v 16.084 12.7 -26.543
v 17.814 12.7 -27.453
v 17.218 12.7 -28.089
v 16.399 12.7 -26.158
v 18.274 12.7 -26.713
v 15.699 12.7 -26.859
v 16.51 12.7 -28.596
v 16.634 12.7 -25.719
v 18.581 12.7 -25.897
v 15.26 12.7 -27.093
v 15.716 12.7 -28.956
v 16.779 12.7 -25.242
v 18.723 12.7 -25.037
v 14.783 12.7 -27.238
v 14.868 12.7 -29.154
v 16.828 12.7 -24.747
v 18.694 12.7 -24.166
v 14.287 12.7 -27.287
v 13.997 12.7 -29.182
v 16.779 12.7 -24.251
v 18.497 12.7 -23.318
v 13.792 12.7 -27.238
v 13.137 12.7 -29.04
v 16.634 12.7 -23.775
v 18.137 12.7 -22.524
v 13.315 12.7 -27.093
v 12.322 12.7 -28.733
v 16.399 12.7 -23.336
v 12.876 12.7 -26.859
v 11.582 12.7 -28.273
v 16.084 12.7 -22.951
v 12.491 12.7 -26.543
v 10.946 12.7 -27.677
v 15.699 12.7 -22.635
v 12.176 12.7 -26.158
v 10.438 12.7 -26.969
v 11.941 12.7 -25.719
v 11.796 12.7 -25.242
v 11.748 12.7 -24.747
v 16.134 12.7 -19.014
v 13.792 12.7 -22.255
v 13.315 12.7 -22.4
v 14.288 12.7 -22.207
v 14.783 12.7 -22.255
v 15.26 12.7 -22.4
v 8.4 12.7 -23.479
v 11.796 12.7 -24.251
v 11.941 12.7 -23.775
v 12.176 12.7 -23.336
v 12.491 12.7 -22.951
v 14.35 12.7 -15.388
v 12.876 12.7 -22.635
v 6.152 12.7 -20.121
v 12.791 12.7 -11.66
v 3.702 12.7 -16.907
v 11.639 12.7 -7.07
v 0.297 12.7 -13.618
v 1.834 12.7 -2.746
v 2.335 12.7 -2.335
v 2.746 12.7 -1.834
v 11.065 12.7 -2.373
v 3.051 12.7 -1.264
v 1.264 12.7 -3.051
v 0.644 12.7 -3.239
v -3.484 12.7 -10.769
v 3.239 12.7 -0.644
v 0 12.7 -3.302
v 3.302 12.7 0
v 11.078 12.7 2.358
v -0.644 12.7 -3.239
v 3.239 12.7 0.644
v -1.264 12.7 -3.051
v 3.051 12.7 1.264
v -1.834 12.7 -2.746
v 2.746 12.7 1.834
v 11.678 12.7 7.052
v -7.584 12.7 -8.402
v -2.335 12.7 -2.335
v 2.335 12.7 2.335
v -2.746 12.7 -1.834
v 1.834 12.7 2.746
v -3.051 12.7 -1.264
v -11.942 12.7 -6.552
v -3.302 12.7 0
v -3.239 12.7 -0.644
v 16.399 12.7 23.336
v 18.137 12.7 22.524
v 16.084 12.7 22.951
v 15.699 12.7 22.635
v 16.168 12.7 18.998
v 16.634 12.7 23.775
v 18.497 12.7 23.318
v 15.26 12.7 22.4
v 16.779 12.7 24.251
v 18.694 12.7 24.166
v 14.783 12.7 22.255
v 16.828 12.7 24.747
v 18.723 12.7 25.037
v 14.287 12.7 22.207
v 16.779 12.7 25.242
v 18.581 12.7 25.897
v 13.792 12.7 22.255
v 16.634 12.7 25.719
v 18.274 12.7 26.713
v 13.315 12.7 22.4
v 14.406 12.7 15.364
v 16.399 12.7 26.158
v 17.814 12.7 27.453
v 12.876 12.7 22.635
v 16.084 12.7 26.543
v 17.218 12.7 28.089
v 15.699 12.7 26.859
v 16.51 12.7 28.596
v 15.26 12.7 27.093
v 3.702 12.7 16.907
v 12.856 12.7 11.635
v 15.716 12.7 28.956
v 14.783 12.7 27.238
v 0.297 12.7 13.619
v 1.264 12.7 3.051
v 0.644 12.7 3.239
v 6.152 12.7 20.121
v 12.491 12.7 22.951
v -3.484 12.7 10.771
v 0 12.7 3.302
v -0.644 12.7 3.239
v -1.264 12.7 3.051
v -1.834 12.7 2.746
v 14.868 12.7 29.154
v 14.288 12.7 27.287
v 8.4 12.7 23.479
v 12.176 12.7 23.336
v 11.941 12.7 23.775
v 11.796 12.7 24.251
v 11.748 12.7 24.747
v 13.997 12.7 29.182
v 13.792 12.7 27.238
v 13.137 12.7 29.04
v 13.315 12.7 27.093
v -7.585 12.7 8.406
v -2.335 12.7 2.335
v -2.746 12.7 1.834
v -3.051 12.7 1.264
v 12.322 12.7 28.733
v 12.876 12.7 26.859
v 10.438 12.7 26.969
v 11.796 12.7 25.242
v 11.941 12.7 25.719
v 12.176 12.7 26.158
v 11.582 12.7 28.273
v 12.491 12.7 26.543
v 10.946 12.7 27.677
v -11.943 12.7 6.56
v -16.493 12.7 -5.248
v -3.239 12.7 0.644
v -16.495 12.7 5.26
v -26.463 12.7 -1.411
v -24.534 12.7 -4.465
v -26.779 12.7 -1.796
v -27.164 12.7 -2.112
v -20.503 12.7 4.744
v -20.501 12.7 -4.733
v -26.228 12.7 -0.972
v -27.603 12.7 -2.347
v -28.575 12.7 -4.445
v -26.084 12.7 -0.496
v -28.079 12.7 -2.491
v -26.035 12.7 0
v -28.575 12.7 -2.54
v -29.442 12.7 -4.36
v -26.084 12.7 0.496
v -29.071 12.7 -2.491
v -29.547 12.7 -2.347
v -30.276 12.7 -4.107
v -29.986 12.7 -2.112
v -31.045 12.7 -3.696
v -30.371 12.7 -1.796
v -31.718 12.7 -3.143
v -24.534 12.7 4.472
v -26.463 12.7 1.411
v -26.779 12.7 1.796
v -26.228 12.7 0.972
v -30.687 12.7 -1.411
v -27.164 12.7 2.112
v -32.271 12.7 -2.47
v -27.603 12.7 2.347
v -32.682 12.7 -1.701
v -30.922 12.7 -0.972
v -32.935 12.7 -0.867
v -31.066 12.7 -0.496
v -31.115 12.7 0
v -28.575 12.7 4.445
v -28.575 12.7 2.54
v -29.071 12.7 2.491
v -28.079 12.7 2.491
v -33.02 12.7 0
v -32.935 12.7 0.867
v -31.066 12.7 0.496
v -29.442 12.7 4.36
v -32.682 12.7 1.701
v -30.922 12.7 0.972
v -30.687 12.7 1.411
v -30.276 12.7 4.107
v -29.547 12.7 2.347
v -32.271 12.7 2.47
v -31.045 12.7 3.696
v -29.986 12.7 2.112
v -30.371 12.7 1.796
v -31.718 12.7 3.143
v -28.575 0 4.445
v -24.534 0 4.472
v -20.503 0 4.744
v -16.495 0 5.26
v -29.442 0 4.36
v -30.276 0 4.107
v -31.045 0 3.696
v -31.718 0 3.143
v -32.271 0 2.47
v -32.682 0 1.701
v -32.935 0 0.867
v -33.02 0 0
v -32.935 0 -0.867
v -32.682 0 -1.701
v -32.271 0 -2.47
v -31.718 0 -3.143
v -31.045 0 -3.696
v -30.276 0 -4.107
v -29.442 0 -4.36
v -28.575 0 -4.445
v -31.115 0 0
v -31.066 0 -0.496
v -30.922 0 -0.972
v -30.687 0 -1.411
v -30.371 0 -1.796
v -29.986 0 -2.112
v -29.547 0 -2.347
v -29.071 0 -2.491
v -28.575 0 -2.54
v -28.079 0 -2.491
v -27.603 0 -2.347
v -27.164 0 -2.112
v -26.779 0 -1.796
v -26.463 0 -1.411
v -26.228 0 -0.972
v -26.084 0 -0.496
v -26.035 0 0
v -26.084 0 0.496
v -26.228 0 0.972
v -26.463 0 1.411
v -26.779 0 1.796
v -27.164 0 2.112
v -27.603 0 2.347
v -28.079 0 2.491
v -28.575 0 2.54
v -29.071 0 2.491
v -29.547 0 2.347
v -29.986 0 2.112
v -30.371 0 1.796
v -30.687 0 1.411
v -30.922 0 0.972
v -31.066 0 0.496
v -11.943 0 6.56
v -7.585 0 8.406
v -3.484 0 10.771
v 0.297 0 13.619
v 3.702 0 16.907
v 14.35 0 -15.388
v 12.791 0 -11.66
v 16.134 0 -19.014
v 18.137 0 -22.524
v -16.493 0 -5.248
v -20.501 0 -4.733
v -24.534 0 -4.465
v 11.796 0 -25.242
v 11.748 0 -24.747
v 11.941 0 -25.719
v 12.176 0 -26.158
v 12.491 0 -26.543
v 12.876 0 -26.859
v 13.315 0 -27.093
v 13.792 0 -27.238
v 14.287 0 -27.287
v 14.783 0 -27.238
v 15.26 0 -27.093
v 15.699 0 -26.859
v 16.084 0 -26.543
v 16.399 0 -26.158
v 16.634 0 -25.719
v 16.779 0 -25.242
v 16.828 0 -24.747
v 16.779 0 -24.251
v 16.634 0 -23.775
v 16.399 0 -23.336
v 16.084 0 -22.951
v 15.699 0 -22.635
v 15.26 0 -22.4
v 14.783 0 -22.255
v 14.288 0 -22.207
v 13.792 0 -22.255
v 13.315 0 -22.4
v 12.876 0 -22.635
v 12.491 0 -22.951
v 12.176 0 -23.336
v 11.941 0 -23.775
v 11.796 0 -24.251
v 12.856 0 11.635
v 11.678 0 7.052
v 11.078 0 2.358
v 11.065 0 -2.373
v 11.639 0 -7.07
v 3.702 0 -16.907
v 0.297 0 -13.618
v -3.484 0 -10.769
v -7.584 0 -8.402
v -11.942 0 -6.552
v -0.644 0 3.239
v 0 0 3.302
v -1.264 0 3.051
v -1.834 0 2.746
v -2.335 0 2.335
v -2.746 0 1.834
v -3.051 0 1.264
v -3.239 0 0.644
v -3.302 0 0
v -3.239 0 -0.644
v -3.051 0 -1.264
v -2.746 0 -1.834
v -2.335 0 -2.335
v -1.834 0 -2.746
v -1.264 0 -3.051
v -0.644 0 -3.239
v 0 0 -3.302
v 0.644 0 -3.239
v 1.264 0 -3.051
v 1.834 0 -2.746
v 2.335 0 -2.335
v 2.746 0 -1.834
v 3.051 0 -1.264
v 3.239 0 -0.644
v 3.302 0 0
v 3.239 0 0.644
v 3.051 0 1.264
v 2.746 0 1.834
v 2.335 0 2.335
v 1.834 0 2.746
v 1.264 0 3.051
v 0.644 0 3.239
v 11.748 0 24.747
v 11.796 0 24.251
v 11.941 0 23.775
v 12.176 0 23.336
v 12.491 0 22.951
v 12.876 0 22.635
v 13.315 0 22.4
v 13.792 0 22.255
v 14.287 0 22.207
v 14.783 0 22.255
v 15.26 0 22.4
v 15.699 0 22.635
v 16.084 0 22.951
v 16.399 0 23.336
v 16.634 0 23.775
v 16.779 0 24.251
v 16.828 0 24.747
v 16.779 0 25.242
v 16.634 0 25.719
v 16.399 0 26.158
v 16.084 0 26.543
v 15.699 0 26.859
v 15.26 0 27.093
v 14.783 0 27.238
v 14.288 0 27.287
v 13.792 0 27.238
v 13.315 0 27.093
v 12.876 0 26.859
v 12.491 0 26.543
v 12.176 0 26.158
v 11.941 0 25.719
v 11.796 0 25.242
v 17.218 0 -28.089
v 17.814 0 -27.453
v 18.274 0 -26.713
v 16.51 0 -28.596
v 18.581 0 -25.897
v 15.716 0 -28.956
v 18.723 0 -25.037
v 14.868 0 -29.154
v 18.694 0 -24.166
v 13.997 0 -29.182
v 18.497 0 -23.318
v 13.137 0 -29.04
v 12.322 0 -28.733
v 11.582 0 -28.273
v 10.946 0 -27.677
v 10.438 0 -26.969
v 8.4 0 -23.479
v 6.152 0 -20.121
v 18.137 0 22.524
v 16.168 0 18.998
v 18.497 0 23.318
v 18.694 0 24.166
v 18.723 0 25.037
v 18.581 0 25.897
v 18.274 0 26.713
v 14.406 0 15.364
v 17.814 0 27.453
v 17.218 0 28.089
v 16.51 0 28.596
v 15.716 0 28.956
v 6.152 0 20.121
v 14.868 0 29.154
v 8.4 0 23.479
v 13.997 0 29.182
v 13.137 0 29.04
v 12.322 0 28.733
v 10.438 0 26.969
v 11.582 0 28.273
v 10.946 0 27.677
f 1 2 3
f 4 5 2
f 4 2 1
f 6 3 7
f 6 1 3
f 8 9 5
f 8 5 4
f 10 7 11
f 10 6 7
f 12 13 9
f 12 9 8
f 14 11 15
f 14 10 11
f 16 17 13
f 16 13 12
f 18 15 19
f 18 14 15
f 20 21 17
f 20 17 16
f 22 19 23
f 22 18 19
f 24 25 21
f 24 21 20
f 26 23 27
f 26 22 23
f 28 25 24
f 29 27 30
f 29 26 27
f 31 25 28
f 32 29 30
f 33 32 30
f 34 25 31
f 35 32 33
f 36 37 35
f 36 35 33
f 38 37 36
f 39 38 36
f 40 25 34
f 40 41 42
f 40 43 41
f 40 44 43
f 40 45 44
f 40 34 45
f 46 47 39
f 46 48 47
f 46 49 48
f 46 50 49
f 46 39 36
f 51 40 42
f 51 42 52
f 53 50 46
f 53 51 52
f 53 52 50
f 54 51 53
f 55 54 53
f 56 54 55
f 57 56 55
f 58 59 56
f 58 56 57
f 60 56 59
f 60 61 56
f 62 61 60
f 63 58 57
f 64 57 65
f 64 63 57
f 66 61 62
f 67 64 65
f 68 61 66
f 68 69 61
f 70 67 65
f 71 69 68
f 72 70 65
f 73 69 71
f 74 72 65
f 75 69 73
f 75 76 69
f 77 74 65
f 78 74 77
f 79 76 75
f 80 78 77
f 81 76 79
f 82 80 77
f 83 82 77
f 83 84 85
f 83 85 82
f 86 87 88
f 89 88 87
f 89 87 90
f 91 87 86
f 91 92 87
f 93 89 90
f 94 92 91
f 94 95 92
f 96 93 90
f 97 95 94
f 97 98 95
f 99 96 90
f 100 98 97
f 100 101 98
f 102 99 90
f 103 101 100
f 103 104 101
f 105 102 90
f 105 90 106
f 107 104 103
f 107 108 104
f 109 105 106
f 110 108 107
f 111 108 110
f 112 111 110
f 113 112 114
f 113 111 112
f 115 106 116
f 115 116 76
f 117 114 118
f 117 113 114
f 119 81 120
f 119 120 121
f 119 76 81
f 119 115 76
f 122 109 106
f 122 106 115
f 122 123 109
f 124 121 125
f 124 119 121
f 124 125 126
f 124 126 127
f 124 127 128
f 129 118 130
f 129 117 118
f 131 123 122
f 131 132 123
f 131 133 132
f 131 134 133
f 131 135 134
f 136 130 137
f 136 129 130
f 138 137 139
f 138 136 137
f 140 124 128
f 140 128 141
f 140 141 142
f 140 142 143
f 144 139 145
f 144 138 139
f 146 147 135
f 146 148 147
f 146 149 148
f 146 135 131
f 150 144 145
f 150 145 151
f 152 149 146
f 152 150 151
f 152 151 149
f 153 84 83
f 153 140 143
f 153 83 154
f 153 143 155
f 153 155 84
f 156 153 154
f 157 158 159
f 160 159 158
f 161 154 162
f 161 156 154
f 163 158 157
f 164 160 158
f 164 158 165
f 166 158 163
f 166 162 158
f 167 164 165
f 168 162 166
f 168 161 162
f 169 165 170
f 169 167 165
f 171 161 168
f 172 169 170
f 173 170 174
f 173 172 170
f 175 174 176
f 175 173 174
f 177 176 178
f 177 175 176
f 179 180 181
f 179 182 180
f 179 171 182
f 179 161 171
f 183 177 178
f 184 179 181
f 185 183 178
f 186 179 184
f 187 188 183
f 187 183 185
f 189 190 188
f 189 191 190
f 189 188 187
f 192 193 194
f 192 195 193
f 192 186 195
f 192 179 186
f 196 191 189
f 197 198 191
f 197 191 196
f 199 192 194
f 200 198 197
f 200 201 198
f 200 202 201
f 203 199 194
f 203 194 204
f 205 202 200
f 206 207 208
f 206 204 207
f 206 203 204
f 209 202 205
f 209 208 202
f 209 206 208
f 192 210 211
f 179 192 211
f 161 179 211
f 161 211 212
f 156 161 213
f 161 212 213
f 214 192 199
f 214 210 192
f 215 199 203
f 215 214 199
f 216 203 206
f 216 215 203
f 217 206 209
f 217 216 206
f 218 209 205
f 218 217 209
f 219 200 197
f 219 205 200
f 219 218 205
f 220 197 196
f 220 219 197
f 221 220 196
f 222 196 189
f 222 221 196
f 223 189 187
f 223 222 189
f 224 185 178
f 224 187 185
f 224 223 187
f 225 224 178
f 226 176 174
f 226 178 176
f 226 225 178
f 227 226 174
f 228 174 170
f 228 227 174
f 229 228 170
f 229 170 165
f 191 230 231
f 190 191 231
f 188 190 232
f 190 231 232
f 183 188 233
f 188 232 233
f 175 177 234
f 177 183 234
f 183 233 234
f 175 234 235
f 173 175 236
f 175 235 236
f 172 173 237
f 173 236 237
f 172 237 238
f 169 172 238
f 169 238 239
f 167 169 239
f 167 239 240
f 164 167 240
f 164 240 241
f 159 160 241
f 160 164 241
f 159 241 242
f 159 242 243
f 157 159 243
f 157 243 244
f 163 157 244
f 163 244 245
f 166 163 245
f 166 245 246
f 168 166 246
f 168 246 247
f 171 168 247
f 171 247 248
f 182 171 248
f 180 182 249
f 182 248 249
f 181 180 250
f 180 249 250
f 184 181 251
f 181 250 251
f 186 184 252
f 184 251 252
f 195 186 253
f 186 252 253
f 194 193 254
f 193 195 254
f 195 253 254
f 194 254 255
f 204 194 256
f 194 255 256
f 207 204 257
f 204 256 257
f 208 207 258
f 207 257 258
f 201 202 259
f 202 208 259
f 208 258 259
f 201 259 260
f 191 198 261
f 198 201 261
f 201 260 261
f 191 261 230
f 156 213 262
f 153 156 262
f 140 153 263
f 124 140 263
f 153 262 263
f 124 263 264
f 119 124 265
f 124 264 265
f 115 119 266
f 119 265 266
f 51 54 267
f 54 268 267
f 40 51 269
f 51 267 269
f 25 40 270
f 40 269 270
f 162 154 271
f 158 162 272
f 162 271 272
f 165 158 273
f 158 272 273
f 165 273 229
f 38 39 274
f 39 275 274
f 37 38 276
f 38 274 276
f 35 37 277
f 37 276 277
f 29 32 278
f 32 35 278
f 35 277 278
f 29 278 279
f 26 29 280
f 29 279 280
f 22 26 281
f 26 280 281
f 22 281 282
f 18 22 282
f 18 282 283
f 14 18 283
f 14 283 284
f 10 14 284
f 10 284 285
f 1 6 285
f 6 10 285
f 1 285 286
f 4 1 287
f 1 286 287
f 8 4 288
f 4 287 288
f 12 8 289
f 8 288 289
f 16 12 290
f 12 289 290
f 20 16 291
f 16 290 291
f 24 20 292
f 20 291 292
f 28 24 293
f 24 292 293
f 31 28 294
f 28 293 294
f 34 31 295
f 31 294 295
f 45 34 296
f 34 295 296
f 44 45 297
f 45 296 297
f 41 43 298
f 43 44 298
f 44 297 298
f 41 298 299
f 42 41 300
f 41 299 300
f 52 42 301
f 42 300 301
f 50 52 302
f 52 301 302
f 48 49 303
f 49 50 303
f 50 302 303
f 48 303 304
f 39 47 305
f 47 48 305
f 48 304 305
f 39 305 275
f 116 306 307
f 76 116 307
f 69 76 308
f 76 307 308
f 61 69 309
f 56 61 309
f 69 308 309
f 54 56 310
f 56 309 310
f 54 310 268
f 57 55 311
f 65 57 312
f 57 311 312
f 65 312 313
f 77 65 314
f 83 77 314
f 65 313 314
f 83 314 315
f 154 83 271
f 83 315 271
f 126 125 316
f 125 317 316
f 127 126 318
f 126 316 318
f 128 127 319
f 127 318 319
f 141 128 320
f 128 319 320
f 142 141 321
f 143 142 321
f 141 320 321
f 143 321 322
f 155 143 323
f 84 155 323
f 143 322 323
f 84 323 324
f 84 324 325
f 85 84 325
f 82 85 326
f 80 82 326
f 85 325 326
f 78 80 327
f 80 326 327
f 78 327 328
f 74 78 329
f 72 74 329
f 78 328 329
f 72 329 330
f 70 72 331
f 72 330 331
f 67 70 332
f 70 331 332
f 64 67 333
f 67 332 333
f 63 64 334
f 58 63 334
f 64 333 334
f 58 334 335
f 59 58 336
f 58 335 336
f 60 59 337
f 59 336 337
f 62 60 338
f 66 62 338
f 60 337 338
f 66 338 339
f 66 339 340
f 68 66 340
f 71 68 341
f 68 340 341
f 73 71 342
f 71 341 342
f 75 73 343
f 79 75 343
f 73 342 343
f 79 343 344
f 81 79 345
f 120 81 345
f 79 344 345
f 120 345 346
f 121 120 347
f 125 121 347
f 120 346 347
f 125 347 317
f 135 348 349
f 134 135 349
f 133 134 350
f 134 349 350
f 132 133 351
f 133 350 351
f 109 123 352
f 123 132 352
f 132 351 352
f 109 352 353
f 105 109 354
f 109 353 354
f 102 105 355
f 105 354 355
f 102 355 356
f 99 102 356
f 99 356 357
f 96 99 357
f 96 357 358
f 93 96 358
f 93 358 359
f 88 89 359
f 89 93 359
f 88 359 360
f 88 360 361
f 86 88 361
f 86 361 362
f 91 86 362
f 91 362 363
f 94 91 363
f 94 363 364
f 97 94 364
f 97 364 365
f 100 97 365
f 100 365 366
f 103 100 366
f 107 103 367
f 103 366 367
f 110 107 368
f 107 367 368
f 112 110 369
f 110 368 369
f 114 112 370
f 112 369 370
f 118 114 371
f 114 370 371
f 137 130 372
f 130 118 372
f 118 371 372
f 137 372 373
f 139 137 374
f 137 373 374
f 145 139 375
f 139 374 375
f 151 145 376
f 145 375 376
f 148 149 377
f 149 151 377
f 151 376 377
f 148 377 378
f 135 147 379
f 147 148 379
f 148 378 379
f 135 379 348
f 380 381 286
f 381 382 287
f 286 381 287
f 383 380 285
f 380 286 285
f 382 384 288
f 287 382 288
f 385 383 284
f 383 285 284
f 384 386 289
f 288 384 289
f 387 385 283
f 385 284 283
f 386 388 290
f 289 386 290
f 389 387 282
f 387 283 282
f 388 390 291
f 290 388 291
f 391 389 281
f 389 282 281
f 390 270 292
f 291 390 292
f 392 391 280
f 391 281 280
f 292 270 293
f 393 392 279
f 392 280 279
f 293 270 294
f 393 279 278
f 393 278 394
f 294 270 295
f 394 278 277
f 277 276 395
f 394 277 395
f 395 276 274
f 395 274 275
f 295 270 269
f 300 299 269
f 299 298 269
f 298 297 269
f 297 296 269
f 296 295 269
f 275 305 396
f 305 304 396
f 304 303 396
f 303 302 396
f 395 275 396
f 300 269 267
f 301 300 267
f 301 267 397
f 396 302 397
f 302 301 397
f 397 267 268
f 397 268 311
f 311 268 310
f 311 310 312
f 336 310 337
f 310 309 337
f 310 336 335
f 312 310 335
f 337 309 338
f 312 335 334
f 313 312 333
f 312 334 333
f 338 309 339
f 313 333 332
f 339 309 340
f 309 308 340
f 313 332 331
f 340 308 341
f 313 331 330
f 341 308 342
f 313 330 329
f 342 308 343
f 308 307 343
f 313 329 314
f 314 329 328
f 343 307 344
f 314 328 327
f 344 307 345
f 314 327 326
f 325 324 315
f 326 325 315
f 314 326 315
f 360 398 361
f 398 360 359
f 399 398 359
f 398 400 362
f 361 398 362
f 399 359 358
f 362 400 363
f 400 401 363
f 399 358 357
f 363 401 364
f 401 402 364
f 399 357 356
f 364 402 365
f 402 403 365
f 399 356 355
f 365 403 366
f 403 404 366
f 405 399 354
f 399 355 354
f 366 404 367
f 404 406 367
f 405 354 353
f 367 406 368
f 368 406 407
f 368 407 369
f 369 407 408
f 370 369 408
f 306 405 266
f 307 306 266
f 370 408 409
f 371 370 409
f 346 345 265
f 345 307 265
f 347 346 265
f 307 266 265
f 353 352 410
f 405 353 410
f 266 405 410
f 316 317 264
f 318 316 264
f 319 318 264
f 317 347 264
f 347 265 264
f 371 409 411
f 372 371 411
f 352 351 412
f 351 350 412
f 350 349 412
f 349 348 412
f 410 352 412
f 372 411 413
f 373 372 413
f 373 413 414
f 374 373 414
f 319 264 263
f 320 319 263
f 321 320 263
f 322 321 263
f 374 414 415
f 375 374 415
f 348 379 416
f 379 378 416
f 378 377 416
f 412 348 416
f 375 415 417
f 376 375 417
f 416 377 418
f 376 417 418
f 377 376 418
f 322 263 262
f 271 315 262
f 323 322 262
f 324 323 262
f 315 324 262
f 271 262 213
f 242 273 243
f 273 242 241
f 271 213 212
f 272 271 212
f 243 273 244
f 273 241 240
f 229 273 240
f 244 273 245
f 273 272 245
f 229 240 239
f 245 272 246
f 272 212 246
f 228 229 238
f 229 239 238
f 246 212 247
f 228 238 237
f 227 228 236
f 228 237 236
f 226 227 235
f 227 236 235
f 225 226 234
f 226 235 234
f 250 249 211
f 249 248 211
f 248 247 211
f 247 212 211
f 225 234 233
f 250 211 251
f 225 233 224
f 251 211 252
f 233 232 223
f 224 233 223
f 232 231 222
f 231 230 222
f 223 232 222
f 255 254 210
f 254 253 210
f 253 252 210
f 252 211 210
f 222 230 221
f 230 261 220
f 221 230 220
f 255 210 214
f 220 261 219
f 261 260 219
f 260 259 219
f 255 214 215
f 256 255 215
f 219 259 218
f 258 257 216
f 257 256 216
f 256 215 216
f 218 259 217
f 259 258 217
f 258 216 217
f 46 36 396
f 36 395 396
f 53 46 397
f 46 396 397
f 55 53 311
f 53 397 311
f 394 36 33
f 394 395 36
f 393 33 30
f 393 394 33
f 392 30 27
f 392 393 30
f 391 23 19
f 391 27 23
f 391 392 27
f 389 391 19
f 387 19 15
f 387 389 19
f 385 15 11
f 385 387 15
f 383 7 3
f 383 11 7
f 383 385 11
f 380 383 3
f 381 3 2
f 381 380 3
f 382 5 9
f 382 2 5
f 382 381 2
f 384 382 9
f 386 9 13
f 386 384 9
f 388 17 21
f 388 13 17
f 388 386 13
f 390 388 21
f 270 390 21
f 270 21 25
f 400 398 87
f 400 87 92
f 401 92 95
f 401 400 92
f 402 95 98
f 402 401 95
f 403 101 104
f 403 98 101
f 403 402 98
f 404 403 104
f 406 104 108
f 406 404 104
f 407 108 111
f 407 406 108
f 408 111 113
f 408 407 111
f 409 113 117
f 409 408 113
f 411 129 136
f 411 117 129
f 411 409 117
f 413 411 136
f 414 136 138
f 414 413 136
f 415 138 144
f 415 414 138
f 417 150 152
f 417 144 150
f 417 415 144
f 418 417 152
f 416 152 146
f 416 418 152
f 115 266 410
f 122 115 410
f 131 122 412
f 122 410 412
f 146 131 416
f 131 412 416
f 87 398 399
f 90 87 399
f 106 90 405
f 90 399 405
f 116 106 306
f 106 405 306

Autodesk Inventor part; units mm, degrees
ref_plane "YZ Plane" through (0, 0, 0) normal (1, 0, 0) x (0, 1, 0)
ref_plane "XZ Plane" through (0, 0, 0) normal (0, 1, 0) x (-1, 0, 0)
ref_plane "XY Plane" through (0, 0, 0) normal (0, 0, 1) x (1, 0, 0)
sketch "Sketch1" plane through (0, 0, 0) normal (0, 1, 0) x (-1, 0, 0)
  line L0 (0, 0) -> (28.575, 0)
  line L1 (28.575, 0) -> (0, 0)
  line L2 (0, 0) -> (-14.2875, -24.746676)
  line L3 (0, 0) -> (28.575, 0) construction
  line L4 (0, 0) -> (-14.2875, 24.746676)
  line L5 (0, 0) -> (28.575, 0) construction
  circle A0 centre (28.575, 0) radius 2.54
  circle A1 centre (-14.2875, -24.746676) radius 2.54
  circle A2 centre (-14.2875, 24.746676) radius 2.54
  circle A3 centre (0, 0) radius 3.175
  dimension "d0" = 28.575
  dimension "d1" = 28.575
  dimension "d2" = 120
  dimension "d3" = 28.575
  dimension "d4" = 120
  dimension "d5" = 5.08
  dimension "d6" = 5.08
  dimension "d7" = 5.08
  dimension "d9" = 6.35
sketch "Sketch2" plane through (0, 0, 0) normal (0, 1, 0) x (-1, 0, 0)
  circle A0 centre (28.575, 0) radius 2.54
  circle A1 centre (-14.2875, -24.746676) radius 2.54
  circle A2 centre (-14.2875, 24.746676) radius 2.54
  circle A3 centre (28.575, 0) radius 4.445
  circle A4 centre (-14.2875, -24.746676) radius 4.445
  circle A5 centre (-14.2875, 24.746676) radius 4.445
  circle A6 centre (0, 0) radius 6.35
  circle A7 centre (0, 0) radius 9.525
  line L0 (28.575, 4.445) -> (28.575, -4.445)
  line L1 (-14.2875, 24.746676) -> (0, 0)
  line L2 (0, 0) -> (-14.2875, 24.746676)
  line L3 (-14.2875, 24.746676) -> (-10.438017, 26.969176)
  line L4 (-14.2875, 24.746676) -> (-18.136983, 22.524176)
  line L5 (0, 0) -> (-14.2875, -24.746676)
  line L6 (-10.438017, -26.969176) -> (-14.2875, -24.746676)
  line L7 (-18.136983, -22.524176) -> (-14.2875, -24.746676)
  arc A8 (4.7625, 8.248892) -> (28.575, 4.445) centre (26.99693, 71.00172) ccw
  arc A9 (28.575, -4.445) -> (4.7625, -8.248892) centre (26.881025, -70.276152) ccw
  arc A10 (4.7625, -8.248892) -> (-10.438017, -26.969176) centre (47.42042, -58.417726) ccw
  arc A11 (-18.136983, -22.524176) -> (-9.525, 0) centre (-74.301445, 11.858426) ccw
  arc A12 (-9.525, 0) -> (-18.136983, 22.524176) centre (-78.365024, -13.41211) ccw
  arc A13 (-10.438017, 26.969176) -> (4.7625, 8.248892) centre (47.42042, 58.417726) ccw
  arc A14 (-3.701951, 16.907326) -> (16.495087, 5.259811) centre (24.822359, 43.03428) ccw
  arc A15 (16.493149, -5.24768) -> (-3.701951, -16.907326) centre (24.881633, -43.096252) ccw
  line L8 (-9.525, 0) -> (-10.9982, 0)
  arc A16 (-12.791199, -11.659646) -> (-12.855666, 11.634998) centre (-49.072802, -0.112643) ccw
  dimension "d10" = 8.89
  dimension "d11" = 8.89
  dimension "d12" = 8.89
  dimension "d13" = 12.7
  dimension "d14" = 19.05
  dimension "d15" = 1.4732
sketch "Sketch2 outline for Extrusion1" plane through (0, 0, 0) normal (0, 1, 0) x (-1, 0, 0)
  arc A0 (-10.438017, 26.969176) -> (-18.136983, 22.524176) centre (-14.2875, 24.746676) ccw
  arc A1 (-3.701951, 16.907326) -> (-10.438017, 26.969176) centre (47.42042, 58.417726) cw
  arc A2 (-18.136983, 22.524176) -> (-12.855666, 11.634998) centre (-78.365024, -13.41211) cw
  arc A3 (16.495087, 5.259811) -> (-3.701951, 16.907326) centre (24.822359, 43.03428) cw
  arc A4 (-12.855666, 11.634998) -> (-12.791199, -11.659646) centre (-49.072802, -0.112643) cw
  arc A5 (28.575, 4.445) -> (16.495087, 5.259811) centre (26.99693, 71.00172) cw
  arc A6 (-12.791199, -11.659646) -> (-18.136983, -22.524176) centre (-74.301445, 11.858426) cw
  arc A7 (28.575, -4.445) -> (28.575, 4.445) centre (28.575, 0) ccw
  arc A8 (-18.136983, -22.524176) -> (-10.438017, -26.969176) centre (-14.2875, -24.746676) ccw
  arc A9 (16.493149, -5.24768) -> (28.575, -4.445) centre (26.881025, -70.276152) cw
  arc A10 (-10.438017, -26.969176) -> (-3.701951, -16.907326) centre (47.42042, -58.417726) cw
  arc A11 (-3.701951, -16.907326) -> (16.493149, -5.24768) centre (24.881633, -43.096252) cw
  circle A12 centre (-14.2875, -24.746676) radius 2.54
  circle A13 centre (-14.2875, 24.746676) radius 2.54
  circle A14 centre (28.575, 0) radius 2.54
extrude "Extrusion1" add sketch "Sketch2 outline for Extrusion1" along normal blind 12.7
hole "Hole1" at (0, 0, 0) direction (0, 1, 0) diameter 6.35 end through all
sketch "Sketch3" plane through (0, 12.7, 0) normal (0, 1, 0) x (1, 0, 0)
  circle A0 centre (0, 0) radius 3.175 projected
hole "Hole2" at (0, 12.7, 0) direction (0, -1, 0) diameter 6.604 end through all
properties part number "stability"
